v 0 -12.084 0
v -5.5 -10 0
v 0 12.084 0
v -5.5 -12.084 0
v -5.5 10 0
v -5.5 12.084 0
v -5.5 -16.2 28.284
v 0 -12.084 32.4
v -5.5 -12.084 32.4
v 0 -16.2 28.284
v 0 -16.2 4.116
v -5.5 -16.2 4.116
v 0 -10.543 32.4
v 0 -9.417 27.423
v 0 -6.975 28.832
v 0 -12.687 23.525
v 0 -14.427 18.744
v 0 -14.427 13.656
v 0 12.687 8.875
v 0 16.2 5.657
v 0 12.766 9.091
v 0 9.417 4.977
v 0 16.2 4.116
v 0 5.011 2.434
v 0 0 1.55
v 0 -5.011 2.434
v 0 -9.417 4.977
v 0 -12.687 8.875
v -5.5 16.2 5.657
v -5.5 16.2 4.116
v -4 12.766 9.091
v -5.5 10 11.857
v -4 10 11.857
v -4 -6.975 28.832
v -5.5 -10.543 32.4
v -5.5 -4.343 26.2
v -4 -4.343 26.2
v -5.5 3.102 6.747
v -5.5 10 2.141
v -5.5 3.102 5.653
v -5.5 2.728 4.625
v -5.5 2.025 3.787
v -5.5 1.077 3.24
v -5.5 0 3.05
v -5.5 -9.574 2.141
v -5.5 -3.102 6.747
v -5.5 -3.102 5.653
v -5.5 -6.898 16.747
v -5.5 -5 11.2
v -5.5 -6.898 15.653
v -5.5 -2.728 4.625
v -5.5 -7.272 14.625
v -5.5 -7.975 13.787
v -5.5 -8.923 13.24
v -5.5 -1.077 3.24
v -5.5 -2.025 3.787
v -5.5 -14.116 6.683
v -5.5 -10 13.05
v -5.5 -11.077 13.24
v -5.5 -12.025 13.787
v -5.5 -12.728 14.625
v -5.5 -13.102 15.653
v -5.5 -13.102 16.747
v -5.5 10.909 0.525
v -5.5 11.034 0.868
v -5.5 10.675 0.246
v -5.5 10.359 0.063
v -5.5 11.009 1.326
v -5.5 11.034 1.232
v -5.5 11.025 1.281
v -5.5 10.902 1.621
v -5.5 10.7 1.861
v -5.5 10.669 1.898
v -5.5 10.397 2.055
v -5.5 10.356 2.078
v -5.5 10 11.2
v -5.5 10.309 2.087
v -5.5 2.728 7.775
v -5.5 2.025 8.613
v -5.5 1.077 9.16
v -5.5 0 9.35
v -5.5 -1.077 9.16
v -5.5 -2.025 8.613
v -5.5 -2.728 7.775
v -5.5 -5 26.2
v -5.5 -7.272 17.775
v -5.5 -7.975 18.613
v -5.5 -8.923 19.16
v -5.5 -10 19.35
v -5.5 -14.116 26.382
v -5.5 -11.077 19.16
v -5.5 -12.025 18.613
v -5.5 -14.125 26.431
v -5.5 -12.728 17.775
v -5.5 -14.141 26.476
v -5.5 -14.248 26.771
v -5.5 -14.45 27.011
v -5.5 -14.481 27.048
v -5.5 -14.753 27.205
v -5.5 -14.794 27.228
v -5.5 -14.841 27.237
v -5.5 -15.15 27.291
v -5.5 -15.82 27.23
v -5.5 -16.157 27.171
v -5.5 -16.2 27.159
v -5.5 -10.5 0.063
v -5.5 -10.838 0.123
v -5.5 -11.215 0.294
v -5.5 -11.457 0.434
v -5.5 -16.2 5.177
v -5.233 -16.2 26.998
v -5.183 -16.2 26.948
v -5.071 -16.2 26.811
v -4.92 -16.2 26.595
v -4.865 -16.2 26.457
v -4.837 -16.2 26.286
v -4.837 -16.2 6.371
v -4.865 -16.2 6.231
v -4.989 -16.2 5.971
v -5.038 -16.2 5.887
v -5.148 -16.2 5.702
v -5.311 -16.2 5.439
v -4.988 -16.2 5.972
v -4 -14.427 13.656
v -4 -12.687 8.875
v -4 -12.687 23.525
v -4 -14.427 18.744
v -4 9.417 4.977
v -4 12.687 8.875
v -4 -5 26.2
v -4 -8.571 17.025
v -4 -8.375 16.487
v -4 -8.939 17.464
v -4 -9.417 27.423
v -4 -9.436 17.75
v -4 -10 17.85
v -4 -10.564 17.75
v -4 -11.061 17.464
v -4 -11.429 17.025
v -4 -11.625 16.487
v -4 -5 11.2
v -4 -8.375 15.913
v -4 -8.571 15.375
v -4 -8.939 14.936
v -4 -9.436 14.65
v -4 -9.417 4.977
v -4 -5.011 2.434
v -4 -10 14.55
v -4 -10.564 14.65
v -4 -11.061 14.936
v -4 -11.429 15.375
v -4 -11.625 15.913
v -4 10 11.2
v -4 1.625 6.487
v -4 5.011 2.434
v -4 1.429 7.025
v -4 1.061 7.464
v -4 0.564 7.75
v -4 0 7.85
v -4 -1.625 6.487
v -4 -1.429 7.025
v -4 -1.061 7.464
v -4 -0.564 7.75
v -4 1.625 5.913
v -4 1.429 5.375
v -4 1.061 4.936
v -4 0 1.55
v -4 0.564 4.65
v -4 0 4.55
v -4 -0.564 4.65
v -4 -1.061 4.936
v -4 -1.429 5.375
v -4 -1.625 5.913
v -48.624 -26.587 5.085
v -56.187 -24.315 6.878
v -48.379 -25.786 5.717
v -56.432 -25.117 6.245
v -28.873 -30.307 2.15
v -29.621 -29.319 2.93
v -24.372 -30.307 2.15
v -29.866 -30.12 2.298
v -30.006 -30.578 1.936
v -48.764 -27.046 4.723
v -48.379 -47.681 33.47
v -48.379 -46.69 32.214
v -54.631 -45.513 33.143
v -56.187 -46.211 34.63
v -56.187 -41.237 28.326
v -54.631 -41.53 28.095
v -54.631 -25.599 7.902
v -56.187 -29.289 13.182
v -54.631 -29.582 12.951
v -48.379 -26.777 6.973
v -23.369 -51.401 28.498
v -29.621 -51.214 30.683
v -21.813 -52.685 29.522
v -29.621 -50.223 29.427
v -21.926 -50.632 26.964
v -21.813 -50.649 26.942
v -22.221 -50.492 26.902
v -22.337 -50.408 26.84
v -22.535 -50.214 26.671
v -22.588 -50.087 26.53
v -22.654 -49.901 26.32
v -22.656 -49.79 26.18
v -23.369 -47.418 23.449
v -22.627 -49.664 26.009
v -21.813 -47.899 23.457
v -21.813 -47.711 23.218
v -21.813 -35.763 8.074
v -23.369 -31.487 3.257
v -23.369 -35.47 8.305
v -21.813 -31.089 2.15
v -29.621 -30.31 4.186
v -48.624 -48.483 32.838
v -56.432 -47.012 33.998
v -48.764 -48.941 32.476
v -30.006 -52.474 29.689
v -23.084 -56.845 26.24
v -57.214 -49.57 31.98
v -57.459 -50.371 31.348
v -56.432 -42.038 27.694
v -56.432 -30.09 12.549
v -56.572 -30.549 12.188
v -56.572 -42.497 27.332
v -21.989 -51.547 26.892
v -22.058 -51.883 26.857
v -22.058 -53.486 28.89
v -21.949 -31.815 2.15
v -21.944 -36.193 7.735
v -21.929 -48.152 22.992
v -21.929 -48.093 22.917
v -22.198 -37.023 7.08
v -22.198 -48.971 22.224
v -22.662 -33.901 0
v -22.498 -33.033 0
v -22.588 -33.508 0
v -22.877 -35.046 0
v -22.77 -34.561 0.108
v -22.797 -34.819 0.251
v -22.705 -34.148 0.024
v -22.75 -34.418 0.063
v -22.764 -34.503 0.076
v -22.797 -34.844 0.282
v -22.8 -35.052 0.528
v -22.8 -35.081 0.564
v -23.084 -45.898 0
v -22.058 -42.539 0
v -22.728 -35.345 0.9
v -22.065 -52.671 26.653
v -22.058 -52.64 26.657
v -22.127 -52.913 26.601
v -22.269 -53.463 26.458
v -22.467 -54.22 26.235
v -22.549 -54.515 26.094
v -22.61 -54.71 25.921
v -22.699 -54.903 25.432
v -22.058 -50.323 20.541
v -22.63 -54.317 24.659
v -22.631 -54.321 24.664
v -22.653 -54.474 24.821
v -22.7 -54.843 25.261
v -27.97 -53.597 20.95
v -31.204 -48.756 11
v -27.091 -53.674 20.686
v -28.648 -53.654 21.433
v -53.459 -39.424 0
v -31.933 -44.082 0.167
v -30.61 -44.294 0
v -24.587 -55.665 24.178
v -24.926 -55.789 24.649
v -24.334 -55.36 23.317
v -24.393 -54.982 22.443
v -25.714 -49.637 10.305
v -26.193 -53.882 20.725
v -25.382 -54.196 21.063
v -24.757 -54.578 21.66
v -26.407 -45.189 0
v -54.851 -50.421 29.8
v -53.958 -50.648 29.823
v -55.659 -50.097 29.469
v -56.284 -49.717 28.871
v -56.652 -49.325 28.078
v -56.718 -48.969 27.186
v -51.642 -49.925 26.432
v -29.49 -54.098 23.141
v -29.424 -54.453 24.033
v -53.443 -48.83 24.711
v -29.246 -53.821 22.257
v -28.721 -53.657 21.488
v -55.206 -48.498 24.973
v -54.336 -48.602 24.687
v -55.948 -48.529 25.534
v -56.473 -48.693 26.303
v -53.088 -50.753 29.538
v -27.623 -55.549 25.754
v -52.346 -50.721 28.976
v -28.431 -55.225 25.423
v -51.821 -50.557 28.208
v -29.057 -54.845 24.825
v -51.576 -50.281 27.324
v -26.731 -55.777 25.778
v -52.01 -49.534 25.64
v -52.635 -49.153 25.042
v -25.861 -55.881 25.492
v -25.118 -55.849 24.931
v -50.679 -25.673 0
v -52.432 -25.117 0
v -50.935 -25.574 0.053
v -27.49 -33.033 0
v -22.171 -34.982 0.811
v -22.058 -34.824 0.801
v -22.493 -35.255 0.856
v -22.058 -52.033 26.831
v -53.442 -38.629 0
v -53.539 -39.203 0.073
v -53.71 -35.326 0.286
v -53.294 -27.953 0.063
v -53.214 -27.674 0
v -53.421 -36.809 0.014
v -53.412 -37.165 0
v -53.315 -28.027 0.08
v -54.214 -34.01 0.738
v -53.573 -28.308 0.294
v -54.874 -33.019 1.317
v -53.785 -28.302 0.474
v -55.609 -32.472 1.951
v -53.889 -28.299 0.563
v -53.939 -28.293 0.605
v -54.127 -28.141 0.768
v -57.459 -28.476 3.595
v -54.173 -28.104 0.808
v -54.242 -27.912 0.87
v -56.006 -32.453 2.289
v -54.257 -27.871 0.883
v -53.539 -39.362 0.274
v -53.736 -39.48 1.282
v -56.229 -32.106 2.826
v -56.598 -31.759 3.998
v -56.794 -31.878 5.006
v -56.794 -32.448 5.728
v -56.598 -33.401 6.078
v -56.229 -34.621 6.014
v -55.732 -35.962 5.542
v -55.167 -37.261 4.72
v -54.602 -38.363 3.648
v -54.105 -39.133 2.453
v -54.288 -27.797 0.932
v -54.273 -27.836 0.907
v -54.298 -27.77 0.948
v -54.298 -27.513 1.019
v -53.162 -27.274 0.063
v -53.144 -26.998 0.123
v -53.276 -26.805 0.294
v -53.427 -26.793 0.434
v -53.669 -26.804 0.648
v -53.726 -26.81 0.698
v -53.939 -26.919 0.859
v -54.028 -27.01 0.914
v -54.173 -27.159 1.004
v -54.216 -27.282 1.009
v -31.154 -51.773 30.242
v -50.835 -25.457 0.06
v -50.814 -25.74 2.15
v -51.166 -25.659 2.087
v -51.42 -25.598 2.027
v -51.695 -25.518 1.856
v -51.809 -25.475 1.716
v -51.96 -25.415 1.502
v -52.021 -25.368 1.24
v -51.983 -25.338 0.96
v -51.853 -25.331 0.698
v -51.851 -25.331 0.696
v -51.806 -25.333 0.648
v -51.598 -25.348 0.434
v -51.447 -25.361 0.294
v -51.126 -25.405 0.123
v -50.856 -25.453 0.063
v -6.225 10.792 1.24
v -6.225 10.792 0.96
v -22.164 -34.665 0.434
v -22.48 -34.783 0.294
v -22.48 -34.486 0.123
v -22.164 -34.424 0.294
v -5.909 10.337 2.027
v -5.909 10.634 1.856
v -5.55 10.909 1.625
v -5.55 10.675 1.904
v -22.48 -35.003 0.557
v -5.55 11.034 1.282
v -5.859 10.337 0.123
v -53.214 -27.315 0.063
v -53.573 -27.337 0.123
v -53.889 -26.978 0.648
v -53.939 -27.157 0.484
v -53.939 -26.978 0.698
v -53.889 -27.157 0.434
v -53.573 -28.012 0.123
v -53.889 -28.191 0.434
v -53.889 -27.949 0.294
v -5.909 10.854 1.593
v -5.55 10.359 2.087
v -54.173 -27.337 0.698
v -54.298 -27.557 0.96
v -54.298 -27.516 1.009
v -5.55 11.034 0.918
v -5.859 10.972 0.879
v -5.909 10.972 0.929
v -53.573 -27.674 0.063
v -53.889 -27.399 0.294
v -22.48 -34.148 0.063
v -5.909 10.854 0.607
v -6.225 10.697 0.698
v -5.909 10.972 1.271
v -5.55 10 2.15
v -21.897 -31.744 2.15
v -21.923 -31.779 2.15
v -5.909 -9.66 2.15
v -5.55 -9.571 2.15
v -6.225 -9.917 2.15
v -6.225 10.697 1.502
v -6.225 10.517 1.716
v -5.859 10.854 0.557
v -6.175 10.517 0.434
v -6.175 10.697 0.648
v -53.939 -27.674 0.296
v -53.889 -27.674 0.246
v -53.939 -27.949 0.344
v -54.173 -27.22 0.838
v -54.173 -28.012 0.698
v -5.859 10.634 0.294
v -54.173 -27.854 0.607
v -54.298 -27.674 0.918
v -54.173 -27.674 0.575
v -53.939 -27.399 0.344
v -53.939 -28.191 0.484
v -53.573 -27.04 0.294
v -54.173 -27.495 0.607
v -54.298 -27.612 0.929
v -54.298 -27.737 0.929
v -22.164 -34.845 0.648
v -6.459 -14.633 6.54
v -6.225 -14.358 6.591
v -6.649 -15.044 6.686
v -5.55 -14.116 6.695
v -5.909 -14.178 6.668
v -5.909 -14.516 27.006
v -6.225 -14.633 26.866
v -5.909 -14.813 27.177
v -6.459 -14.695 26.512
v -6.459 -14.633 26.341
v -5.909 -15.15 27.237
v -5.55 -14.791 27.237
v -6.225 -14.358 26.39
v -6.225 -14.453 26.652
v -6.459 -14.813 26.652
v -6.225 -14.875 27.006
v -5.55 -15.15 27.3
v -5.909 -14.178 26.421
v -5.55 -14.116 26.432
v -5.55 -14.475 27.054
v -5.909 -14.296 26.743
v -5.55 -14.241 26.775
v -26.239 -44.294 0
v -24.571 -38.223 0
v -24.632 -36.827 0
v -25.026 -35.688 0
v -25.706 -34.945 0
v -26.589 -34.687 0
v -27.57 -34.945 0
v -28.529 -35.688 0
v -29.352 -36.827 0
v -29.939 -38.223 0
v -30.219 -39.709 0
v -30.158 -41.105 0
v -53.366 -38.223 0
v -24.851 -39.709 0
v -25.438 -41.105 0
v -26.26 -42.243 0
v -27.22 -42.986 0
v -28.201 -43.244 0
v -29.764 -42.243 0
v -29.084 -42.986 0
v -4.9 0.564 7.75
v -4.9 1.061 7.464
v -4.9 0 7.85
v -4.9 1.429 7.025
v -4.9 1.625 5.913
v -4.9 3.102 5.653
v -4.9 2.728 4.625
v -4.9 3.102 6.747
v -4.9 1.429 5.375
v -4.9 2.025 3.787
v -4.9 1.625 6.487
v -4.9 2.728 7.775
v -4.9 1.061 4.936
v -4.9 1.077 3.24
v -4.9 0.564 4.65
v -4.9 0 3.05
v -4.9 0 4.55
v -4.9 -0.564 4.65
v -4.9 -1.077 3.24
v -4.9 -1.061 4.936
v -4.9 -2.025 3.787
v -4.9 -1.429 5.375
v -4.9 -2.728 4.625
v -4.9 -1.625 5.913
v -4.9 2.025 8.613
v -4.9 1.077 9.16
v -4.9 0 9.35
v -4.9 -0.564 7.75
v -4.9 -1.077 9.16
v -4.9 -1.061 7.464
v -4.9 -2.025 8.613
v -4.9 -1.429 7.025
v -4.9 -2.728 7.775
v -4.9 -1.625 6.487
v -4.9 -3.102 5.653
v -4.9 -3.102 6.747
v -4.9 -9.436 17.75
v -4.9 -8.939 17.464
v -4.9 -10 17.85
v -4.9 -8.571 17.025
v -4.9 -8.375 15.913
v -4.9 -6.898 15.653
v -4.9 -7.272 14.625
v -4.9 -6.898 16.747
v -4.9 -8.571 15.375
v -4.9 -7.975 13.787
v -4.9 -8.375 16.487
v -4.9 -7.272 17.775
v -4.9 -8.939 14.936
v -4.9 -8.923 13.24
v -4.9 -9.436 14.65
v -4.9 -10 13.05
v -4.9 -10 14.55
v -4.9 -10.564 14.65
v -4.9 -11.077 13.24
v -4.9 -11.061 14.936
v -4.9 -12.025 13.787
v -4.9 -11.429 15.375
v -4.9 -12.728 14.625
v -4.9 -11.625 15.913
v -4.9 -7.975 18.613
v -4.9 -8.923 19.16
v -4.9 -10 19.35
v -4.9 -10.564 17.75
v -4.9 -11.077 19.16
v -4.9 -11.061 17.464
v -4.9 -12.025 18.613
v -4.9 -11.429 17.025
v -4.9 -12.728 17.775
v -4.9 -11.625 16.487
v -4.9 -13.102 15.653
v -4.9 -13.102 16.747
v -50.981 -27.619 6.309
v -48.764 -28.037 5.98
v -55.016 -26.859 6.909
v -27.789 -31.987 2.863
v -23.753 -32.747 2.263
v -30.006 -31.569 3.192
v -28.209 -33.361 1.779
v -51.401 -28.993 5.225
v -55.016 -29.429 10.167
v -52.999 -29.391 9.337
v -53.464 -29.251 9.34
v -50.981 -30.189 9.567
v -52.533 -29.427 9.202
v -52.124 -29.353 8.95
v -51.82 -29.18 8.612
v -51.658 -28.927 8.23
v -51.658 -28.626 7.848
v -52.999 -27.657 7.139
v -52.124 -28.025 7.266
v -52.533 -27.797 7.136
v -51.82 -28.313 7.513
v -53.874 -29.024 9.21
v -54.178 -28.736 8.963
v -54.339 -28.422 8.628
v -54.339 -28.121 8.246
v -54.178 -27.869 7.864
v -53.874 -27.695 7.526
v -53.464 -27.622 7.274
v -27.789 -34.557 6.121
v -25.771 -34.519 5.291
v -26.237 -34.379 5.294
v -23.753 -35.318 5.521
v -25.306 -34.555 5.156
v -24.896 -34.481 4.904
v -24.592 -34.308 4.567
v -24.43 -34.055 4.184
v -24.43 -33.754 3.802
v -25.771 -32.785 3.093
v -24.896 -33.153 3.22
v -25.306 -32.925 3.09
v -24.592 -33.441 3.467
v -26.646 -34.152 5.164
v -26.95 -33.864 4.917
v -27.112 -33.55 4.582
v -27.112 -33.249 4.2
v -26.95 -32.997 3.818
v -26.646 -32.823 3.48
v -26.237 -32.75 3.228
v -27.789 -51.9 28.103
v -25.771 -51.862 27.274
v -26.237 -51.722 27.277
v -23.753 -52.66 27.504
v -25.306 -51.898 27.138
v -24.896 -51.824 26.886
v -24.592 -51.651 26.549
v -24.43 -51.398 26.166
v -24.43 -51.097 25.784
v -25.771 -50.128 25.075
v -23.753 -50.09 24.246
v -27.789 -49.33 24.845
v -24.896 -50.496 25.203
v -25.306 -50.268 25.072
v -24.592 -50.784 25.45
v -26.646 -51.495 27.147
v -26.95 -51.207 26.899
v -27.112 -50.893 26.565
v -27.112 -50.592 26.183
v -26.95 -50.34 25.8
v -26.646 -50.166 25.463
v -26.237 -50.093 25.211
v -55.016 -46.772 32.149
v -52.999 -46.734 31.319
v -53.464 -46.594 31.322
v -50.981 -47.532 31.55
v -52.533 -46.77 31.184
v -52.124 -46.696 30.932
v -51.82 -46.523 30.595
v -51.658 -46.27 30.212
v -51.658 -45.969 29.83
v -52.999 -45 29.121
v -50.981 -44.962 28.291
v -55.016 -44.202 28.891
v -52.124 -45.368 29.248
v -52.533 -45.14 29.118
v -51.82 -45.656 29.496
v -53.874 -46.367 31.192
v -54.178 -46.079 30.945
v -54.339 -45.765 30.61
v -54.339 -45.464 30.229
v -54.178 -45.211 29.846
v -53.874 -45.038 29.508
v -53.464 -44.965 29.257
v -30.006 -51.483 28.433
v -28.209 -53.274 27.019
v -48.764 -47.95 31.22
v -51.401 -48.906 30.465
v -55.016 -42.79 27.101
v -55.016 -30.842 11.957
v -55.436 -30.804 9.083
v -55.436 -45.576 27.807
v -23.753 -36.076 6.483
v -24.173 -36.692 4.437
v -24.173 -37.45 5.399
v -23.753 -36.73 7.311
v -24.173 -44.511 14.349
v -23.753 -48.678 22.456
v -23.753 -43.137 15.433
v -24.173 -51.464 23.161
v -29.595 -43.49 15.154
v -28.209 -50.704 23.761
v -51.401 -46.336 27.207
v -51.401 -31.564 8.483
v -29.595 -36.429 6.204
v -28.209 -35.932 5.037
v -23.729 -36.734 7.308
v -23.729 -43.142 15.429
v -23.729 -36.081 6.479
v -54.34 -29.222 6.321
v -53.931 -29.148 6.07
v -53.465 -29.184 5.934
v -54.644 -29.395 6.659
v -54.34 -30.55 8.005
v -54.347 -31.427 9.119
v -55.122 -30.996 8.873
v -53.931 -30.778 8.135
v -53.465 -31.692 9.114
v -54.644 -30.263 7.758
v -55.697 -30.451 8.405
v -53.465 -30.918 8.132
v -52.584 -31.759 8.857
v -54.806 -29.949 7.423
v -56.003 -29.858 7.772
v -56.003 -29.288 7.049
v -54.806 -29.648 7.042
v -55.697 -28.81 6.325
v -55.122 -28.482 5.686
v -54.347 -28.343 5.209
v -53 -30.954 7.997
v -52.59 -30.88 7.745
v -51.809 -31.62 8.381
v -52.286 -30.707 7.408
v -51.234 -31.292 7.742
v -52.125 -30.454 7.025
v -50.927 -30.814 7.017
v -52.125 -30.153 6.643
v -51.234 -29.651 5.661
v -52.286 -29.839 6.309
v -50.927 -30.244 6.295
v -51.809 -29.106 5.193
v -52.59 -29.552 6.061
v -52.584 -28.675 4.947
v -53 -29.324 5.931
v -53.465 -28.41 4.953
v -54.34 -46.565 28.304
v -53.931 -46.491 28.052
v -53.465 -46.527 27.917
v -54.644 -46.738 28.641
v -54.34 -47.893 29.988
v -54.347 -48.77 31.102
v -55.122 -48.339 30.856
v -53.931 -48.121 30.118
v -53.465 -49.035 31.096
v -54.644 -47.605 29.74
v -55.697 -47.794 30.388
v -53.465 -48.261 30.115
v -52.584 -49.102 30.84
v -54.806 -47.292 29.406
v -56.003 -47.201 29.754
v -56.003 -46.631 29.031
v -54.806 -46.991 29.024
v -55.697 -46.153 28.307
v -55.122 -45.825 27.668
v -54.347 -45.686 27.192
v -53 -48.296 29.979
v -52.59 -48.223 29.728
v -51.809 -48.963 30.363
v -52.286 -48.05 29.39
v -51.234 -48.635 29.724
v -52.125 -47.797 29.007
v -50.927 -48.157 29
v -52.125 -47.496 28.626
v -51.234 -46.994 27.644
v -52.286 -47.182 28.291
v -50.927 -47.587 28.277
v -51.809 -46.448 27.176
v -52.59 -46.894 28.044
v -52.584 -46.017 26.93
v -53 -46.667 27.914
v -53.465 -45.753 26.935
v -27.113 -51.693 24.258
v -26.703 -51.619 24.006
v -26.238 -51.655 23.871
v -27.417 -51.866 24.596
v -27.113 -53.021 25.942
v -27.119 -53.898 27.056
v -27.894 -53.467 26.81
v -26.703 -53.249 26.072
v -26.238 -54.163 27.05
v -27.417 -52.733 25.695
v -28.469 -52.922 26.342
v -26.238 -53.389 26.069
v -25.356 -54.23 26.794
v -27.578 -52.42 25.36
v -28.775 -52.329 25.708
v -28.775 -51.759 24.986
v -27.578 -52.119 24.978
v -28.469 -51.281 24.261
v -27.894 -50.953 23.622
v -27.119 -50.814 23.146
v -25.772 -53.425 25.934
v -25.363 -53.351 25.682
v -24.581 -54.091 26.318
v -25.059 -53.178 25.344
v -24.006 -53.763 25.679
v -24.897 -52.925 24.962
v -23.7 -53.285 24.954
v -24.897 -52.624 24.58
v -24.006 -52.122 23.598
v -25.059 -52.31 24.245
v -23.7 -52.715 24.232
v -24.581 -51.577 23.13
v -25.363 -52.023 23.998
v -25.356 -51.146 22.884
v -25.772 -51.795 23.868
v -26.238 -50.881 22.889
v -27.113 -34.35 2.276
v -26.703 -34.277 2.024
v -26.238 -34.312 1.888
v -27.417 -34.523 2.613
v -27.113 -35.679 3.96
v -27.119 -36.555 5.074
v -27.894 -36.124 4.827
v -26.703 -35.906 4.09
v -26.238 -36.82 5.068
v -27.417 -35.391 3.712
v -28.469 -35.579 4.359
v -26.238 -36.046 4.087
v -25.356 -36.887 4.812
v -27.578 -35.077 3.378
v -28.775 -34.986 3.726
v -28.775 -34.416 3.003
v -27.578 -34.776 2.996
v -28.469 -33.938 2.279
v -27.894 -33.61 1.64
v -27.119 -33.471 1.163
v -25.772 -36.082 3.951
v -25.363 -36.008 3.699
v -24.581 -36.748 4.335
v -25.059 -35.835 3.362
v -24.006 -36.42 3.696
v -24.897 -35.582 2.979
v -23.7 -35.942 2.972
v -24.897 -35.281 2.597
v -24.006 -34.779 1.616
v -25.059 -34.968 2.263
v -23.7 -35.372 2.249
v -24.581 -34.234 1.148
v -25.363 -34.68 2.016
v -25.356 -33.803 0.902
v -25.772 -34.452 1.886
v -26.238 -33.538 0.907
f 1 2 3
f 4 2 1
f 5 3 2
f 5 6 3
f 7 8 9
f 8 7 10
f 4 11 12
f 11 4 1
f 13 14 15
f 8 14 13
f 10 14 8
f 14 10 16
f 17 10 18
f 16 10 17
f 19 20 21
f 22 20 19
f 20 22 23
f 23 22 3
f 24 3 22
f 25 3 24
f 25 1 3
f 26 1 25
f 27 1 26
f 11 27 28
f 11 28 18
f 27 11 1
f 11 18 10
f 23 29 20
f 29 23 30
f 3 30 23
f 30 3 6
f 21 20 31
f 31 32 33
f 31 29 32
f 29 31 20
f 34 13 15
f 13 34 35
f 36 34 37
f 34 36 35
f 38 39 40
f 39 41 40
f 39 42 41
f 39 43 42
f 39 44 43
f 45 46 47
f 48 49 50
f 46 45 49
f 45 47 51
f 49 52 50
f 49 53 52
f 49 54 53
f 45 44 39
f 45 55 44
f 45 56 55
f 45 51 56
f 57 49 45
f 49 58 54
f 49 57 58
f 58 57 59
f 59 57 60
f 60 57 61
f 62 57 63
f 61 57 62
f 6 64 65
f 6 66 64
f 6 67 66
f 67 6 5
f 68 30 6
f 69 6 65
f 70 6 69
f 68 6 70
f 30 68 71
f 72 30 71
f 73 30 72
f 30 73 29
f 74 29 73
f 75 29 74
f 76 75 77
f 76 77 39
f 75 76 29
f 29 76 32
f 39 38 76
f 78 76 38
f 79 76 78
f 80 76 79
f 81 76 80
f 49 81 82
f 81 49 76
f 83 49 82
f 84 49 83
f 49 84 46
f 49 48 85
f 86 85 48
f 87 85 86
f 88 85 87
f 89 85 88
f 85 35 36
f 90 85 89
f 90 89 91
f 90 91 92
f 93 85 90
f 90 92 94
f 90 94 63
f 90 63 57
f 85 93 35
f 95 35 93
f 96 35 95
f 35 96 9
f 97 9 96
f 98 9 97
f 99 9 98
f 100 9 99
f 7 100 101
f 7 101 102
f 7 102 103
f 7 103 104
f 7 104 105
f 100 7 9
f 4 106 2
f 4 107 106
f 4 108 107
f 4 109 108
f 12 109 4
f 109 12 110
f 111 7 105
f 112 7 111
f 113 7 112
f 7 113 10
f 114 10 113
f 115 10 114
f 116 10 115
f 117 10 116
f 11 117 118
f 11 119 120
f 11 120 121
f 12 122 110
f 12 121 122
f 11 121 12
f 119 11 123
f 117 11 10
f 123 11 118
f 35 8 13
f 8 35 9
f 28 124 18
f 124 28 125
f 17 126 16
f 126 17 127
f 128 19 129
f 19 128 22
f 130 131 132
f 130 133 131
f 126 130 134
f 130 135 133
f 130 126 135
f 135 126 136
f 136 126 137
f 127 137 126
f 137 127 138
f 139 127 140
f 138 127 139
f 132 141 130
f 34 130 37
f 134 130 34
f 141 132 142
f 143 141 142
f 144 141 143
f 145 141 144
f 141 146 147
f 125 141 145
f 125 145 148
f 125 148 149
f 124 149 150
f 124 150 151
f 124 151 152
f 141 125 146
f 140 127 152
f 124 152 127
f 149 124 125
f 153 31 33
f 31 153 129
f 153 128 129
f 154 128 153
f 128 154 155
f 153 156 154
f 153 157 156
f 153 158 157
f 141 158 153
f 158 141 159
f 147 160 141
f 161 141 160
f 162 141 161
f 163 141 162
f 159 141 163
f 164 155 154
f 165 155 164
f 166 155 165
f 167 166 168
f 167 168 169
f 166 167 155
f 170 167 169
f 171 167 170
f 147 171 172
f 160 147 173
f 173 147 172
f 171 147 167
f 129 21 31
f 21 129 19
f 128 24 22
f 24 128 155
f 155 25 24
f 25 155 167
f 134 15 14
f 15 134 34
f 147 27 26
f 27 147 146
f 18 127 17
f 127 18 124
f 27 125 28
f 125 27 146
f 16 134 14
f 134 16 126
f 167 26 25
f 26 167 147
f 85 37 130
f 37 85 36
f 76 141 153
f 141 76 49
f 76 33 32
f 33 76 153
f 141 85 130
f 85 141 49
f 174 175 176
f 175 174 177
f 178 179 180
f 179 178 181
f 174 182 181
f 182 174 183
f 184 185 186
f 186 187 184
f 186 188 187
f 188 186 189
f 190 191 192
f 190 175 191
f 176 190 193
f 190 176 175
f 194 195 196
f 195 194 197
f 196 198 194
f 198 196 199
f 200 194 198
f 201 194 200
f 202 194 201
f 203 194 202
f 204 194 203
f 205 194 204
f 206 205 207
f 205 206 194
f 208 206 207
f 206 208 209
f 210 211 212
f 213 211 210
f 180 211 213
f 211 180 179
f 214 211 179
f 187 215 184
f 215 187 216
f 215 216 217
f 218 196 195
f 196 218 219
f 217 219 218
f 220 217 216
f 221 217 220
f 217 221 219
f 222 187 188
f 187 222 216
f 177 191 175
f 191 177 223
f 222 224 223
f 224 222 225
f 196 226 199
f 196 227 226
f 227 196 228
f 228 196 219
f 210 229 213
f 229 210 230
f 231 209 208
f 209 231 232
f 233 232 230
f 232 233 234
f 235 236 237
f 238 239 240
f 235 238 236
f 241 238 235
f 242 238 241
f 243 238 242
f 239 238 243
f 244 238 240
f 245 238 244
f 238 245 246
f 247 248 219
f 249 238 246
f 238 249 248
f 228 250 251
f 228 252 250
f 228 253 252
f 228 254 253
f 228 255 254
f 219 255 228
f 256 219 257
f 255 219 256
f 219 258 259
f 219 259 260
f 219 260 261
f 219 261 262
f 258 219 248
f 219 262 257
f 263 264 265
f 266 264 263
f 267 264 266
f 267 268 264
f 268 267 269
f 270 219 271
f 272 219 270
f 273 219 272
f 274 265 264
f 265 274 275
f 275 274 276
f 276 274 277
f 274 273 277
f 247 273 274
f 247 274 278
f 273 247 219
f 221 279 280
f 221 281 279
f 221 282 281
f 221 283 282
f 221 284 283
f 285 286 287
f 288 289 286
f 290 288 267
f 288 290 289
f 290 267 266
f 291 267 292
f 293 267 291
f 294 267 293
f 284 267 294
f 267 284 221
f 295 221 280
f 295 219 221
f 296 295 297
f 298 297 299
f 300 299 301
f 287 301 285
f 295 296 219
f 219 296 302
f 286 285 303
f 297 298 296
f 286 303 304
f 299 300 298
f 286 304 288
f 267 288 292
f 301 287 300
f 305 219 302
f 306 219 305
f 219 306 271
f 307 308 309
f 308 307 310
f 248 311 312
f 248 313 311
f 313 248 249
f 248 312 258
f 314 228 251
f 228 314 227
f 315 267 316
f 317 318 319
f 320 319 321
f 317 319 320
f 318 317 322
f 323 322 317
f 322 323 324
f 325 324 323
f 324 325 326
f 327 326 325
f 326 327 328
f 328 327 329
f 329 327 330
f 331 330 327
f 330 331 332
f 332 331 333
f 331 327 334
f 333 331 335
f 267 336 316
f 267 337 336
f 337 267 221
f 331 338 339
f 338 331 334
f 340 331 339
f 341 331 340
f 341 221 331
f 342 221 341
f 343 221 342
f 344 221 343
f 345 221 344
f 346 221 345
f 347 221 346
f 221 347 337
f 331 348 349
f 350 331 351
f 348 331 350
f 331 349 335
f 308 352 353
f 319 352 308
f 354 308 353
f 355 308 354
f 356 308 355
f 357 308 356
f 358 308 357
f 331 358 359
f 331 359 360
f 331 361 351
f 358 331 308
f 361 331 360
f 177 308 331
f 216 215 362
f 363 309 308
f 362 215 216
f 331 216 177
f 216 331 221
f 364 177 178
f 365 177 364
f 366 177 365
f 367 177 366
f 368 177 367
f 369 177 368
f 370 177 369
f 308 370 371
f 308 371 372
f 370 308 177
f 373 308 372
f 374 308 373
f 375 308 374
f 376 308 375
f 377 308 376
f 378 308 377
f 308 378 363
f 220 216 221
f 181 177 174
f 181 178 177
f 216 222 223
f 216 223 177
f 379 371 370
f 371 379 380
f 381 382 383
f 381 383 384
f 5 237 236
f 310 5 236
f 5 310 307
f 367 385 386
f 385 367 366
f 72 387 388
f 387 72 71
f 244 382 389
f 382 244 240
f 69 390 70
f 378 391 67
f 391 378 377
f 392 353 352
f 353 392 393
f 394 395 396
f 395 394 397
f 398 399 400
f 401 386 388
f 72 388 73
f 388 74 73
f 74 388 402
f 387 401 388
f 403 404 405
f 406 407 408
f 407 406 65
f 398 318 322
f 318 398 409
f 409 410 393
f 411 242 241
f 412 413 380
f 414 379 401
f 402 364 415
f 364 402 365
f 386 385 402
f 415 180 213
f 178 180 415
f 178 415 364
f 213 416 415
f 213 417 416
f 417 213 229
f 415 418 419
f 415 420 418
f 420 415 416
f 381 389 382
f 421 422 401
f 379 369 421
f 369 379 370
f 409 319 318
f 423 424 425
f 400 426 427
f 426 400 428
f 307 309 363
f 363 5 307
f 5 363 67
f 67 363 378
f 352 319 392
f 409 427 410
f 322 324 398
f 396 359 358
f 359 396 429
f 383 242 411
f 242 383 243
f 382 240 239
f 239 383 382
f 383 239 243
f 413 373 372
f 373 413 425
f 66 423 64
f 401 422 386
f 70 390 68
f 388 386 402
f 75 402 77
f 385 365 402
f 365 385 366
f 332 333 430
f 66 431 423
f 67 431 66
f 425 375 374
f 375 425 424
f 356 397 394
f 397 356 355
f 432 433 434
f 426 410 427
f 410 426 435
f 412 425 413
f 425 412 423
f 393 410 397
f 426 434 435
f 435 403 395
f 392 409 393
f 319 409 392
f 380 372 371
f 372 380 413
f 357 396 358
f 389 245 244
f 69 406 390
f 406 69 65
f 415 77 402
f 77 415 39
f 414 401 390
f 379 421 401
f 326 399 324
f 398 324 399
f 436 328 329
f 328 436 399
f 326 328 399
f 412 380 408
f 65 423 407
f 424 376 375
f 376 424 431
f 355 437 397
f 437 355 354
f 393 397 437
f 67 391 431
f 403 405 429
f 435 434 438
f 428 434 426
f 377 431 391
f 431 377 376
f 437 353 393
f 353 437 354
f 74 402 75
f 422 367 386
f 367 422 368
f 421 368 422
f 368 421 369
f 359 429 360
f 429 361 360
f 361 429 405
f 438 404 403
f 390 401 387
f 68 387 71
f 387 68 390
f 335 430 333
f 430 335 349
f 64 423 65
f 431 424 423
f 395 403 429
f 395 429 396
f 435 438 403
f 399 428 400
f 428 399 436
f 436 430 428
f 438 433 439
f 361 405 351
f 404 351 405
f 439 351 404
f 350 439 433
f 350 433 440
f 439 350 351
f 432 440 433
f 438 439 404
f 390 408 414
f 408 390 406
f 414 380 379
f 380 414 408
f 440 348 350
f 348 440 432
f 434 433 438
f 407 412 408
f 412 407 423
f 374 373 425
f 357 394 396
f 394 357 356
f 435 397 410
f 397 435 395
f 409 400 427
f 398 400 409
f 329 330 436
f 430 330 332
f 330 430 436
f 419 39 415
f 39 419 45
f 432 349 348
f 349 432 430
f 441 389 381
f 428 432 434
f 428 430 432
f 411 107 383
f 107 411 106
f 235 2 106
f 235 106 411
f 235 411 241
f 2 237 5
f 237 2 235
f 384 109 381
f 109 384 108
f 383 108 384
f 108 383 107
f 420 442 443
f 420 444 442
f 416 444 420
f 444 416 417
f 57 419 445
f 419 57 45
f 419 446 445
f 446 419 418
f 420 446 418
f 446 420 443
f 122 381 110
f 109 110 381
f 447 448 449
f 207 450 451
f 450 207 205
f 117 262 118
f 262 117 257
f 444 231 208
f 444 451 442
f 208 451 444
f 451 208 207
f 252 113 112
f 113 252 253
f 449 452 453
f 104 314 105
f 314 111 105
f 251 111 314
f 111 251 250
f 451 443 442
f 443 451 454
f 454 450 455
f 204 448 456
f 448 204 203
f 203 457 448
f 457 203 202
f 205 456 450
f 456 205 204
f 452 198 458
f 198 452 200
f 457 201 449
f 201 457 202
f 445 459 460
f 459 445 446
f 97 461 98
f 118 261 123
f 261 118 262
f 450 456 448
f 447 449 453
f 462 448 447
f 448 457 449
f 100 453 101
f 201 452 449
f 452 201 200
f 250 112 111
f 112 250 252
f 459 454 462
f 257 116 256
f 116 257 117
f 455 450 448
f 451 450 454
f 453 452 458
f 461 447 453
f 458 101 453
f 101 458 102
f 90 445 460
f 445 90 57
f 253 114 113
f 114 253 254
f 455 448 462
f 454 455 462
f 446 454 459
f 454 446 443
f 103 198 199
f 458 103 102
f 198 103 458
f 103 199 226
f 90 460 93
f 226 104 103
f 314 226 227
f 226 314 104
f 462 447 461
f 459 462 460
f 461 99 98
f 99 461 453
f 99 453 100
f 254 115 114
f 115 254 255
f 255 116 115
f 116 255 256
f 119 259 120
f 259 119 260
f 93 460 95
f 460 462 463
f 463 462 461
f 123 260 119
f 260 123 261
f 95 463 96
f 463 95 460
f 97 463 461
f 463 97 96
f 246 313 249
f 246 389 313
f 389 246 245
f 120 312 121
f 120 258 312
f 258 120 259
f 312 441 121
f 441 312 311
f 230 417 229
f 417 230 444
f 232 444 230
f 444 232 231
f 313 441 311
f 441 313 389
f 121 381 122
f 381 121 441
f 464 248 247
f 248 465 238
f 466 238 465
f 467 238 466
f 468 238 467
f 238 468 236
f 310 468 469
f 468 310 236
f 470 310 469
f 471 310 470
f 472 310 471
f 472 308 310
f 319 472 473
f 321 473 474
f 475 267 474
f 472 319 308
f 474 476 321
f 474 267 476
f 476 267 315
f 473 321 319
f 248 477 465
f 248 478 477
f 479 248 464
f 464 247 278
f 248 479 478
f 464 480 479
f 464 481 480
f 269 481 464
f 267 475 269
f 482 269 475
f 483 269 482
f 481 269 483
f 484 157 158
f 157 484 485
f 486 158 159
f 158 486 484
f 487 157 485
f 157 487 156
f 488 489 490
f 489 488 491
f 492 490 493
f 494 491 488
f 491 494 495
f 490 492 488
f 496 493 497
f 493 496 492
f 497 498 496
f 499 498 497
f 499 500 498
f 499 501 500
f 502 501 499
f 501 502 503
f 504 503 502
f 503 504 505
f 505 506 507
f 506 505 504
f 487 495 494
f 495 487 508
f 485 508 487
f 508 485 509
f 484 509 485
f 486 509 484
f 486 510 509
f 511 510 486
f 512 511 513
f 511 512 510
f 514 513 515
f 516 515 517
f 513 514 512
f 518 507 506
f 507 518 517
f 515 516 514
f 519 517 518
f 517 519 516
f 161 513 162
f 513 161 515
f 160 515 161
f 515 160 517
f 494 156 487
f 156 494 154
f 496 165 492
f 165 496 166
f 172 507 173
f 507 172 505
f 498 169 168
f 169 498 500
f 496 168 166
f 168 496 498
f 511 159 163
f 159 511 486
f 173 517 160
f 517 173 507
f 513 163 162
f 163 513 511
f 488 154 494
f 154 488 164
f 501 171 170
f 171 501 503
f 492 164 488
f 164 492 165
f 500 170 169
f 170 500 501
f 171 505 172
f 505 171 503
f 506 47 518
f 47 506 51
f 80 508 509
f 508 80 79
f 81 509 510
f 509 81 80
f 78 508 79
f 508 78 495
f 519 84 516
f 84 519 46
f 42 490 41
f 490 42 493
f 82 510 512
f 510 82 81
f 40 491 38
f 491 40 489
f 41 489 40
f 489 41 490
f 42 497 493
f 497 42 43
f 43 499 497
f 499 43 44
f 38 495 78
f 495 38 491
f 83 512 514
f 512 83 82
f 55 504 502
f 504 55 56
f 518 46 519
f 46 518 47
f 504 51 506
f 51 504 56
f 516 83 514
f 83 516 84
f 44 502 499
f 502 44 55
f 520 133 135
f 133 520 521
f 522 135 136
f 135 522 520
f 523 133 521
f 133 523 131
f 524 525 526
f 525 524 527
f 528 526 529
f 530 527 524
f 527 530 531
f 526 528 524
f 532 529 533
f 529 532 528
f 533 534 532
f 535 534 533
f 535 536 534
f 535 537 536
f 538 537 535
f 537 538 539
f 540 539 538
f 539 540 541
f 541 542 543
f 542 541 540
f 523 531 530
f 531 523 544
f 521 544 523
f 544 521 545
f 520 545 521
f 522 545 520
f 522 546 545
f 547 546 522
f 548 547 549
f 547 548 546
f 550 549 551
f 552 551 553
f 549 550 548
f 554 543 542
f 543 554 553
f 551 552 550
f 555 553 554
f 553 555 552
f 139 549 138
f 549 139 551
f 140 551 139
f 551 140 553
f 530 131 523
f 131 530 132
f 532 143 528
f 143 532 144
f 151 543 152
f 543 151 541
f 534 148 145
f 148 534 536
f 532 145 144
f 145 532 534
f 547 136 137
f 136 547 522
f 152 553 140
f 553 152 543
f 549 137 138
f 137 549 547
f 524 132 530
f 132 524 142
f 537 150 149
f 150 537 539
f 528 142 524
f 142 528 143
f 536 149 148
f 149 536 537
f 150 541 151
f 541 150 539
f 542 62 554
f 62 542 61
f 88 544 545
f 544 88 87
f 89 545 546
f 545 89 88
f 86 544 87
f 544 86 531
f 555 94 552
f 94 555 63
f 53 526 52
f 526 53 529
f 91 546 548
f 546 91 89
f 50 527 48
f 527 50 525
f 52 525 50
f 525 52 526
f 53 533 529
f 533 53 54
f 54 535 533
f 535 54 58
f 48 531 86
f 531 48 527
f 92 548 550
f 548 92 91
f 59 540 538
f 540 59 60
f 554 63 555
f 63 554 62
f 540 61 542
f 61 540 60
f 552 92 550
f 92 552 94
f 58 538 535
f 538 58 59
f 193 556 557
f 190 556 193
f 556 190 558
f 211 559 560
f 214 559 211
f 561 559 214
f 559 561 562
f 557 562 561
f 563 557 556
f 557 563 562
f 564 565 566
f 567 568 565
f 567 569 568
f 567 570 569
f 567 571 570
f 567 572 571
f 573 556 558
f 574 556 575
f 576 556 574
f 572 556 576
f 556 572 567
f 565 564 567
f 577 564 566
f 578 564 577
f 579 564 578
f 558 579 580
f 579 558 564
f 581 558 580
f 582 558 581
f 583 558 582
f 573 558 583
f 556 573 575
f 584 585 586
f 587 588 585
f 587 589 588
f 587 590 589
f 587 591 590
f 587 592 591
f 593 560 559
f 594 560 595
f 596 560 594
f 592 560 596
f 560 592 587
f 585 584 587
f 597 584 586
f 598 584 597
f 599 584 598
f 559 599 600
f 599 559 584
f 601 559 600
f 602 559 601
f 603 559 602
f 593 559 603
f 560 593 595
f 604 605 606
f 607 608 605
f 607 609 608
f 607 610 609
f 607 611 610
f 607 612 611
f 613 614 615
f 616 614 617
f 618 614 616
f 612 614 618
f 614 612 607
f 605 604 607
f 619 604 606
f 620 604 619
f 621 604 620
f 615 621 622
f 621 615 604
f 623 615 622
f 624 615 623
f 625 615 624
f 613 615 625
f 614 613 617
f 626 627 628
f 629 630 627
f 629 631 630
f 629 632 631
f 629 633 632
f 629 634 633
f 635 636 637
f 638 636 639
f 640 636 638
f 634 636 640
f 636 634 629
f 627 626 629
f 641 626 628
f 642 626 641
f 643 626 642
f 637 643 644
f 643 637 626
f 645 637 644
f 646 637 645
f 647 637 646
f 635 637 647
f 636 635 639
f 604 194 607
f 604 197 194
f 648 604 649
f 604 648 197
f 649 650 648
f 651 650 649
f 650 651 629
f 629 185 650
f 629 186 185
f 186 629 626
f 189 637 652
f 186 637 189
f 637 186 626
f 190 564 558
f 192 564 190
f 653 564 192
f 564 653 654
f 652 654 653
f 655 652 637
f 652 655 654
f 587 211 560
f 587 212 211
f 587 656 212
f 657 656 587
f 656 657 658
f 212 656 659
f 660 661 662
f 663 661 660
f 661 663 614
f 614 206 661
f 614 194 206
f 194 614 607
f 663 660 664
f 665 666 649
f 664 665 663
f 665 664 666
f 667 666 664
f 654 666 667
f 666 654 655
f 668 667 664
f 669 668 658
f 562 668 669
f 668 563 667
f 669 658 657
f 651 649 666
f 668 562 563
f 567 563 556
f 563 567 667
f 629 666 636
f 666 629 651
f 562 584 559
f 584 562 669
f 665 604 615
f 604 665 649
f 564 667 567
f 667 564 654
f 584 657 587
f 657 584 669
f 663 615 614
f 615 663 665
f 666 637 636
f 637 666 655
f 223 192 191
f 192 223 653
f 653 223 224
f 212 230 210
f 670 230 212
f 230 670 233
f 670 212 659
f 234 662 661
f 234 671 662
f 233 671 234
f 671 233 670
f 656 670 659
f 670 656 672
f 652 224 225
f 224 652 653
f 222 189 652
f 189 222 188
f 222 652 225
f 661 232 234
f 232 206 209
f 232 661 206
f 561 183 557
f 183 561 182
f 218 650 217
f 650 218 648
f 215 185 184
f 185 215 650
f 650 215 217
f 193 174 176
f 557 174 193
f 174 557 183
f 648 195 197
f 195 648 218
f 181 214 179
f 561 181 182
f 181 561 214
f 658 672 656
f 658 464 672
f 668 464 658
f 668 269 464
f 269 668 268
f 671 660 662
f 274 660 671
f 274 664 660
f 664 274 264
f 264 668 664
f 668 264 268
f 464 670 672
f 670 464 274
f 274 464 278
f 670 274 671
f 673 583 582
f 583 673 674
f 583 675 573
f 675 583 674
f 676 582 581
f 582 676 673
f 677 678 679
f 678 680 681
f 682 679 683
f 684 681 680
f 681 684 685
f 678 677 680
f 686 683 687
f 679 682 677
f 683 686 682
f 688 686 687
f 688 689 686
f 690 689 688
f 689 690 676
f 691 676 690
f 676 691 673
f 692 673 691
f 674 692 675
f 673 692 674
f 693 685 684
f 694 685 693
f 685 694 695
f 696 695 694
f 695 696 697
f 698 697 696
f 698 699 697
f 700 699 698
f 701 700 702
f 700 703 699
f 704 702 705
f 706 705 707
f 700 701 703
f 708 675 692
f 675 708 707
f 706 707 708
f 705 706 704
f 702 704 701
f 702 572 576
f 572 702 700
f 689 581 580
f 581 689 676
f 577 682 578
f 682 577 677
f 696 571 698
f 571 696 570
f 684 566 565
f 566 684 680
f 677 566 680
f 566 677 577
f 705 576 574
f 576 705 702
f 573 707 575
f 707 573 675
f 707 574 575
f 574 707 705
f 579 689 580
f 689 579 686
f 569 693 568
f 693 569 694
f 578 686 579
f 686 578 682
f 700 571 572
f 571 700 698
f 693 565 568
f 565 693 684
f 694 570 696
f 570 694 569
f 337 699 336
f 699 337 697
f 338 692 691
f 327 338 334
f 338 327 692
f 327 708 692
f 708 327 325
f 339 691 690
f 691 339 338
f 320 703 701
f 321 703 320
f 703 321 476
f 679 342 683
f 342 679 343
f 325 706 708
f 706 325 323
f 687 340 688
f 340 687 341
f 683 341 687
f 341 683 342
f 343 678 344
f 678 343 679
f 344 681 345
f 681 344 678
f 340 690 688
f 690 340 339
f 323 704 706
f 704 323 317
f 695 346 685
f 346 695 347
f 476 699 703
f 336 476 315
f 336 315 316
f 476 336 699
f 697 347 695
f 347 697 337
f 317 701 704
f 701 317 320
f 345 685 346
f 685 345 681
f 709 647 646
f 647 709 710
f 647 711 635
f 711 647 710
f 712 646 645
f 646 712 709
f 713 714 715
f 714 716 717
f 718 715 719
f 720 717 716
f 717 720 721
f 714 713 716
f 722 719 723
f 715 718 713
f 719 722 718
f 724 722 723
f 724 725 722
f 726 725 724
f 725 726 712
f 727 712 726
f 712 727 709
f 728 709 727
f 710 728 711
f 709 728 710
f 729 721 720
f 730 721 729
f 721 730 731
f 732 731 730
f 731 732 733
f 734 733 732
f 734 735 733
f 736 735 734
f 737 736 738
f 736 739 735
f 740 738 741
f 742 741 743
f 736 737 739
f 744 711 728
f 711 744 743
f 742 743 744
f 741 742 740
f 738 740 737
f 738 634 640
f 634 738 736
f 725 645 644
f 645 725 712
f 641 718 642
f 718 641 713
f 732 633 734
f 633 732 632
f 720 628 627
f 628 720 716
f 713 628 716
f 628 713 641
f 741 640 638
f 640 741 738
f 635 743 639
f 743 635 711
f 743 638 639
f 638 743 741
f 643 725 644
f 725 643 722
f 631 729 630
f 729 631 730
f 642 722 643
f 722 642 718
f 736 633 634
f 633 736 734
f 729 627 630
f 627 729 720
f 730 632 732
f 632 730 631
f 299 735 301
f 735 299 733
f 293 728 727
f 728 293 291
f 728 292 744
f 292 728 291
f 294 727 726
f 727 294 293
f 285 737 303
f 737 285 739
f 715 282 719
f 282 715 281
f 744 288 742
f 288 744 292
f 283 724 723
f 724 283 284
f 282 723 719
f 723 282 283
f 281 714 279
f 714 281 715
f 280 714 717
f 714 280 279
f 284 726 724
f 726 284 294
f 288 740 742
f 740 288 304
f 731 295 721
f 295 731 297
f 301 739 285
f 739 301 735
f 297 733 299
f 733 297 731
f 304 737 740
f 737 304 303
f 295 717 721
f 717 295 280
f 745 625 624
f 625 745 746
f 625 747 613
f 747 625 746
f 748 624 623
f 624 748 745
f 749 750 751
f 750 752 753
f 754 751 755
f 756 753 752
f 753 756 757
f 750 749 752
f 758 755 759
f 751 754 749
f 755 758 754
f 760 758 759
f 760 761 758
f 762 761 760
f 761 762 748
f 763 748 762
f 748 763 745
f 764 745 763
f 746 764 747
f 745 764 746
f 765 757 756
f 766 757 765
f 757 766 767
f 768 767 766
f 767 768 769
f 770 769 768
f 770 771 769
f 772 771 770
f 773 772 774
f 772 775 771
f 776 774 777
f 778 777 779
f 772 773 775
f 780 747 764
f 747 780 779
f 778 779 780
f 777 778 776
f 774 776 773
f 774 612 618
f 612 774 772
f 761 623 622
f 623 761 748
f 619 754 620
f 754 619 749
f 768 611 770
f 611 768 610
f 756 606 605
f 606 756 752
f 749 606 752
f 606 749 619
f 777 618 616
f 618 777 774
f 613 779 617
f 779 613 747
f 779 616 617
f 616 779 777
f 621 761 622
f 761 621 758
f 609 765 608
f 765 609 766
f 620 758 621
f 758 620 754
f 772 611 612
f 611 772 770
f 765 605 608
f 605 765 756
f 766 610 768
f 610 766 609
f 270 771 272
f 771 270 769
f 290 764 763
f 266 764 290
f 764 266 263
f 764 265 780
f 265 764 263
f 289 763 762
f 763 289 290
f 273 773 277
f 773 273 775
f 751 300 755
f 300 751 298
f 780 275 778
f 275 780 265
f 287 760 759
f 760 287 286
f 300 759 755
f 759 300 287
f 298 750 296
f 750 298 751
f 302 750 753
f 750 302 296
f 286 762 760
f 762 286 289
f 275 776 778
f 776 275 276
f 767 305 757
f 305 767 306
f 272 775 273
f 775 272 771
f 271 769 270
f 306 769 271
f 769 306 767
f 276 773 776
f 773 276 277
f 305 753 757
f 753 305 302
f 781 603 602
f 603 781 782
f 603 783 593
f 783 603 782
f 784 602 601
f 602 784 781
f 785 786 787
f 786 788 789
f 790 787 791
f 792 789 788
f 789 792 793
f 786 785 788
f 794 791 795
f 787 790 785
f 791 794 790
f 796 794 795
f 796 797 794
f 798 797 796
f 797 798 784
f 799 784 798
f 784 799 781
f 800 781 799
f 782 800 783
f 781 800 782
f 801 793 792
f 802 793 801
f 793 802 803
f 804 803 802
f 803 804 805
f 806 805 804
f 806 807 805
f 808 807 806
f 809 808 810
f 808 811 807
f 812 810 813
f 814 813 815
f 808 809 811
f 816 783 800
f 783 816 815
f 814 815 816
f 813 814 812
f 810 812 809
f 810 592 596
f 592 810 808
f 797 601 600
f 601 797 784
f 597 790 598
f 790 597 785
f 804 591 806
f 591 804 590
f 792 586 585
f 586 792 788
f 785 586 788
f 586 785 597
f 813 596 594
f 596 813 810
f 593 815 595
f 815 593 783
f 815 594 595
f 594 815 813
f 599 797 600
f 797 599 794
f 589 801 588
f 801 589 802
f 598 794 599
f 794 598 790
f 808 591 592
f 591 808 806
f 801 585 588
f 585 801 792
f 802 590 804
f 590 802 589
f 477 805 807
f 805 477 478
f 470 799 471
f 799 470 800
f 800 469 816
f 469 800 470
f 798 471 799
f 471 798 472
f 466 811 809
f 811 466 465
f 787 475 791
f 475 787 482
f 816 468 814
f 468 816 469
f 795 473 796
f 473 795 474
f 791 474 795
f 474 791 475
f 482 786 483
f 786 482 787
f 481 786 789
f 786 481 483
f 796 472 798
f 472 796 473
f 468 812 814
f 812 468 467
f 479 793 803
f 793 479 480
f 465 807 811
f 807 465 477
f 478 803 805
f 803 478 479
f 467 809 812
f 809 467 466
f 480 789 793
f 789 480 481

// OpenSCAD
// Generated from camera_mount.py
$fa=20; $fs=0.2;


difference(){
	translate(v = [0, 0, 16.2000000000]) {
		rotate(a = 90, v = [0, -1, 0]) {
			difference() {
				union() {
					union() {
						union() {
							difference() {
								difference() {
									difference() {
										linear_extrude(center = false, height = 5.5000000000) {
											intersection() {
												rotate(a = 45) {
													translate(v = [-20, -20]) {
														square(size = [24, 40]);
													}
												}
												square(center = true, size = [32.4000000000, 32.4000000000]);
											}
										}
										translate(v = [-10, 0, 0]) {
											translate(v = [0, 0, 4.9000000000]) {
											}
										}
									}
									translate(v = [0, -10, 0]) {
										translate(v = [0, 0, 4.9000000000]) {
										}
									}
								}
								union() {
									cylinder(h = 4.0000000000, r = 14.6500000000);
									translate(v = [-5, -5, 0]) {
										cube(size = [15, 15, 5.5000200000]);
									}
								}
							}
							translate(v = [2, -38.5000000000, 39.0000000000]) {
								rotate(a = 141.7284958095, v = [0, 0, 1]) {
									rotate(a = 103.4903442936, v = [1, 0, 0]) {
										translate(v = [0, 0, -1.6500000000]) {
											union() {
												union() {
													union() {
														union() {
															difference() {
																translate(v = [-17.6750000000, -17.6750000000, -3.8000000000]) {
																	cube(center = false, size = [35.3500000000, 35.3500000000, 5.4500000000]);
																}
															}
															translate(v = [14.0000000000, 14.0000000000, 0]) {
																union() {
																	translate(v = [-2.0750000000, -2.0750000000, -1.8000000000]) {
																		cube(center = false, size = [4.1500000000, 4.1500000000, 1.8000000000]);
																	}
																	translate(v = [0, 0, -2.0000000000]) {
																		mirror(v = [0, 0, 1]) {
																		}
																	}
																}
															}
														}
														translate(v = [-14.0000000000, 14.0000000000, 0]) {
															union() {
																translate(v = [-2.0750000000, -2.0750000000, -1.8000000000]) {
																	cube(center = false, size = [4.1500000000, 4.1500000000, 1.8000000000]);
																}
																translate(v = [0, 0, -2.0000000000]) {
																	mirror(v = [0, 0, 1]) {
																	}
																}
															}
														}
													}
													translate(v = [-14.0000000000, -14.0000000000, 0]) {
														union() {
															translate(v = [-2.0750000000, -2.0750000000, -1.8000000000]) {
																cube(center = false, size = [4.1500000000, 4.1500000000, 1.8000000000]);
															}
															translate(v = [0, 0, -2.0000000000]) {
																mirror(v = [0, 0, 1]) {
																}
															}
														}
													}
												}
												translate(v = [14.0000000000, -14.0000000000, 0]) {
													union() {
														translate(v = [-2.0750000000, -2.0750000000, -1.8000000000]) {
															cube(center = false, size = [4.1500000000, 4.1500000000, 1.8000000000]);
														}
														translate(v = [0, 0, -2.0000000000]) {
															mirror(v = [0, 0, 1]) {
															}
														}
													}
												}
											}
										}
									}
								}
							}
						}
						polyhedron(faces = [[0, 2, 14], [15, 2, 0], [0, 7, 15], [14, 10, 0], [14, 2, 1], [1, 2, 15], [15, 3, 1], [1, 13, 14], [15, 4, 3], [6, 10, 14], [14, 13, 6], [7, 4, 15], [11, 7, 0], [0, 10, 11], [1, 3, 12], [12, 13, 1], [3, 4, 12], [8, 12, 4], [13, 5, 6], [9, 10, 6], [11, 4, 7], [9, 11, 10], [12, 8, 9], [13, 12, 9], [11, 8, 4], [5, 13, 9], [6, 5, 9], [8, 11, 9]], points = [[-16.2000000000, -42.5386946614, 22.0576121145], [-16.2000000000, -39.423557734, 53.4587175901], [-16.2000000000, -45.8977578213, 23.0840506837], [-16.2000000000, -27.6742687274, 53.2137720224], [-16.2000000000, -25.1168001852, 52.4322790208], [15.7801466406, -49.5696575051, 57.2137720224], [9.62235765664, -54.9938575924, 23.889105116], [-15.1499900000, -34.1484688147, 22.839105116], [-9.95488857563, -25.1168001852, 56.4322790208], [17.797849132, -47.0121889629, 56.4322790208], [12.6900601481, -53.4863890502, 22.0576121145], [-15.0626775596, -31.5910002725, 22.0576121145], [-12.6050052809, -28.4758633451, 57.4587175901], [15.1477324268, -50.3712521228, 57.4587175901], [10.0399434429, -56.8454522102, 23.0840506837], [-17.7127942648, -34.9500634324, 23.0840506837]]);
					}
					union() {
						union() {
							minkowski() {
								polyhedron(faces = [[0, 1, 2], [0, 2, 3], [1, 0, 4], [4, 5, 1], [2, 1, 5], [5, 6, 2], [3, 2, 6], [6, 7, 3], [0, 3, 7], [7, 4, 0], [6, 5, 4], [7, 6, 4]], points = [[-15.1500000000, 10.0000000000, 5.5000000000], [-15.1500000000, -10.0000000000, 5.5000000000], [-15.1499900000, -34.1484688147, 22.839105116], [-15.1499900000, -27.6742687274, 53.2137720224], [-15.1000000000, 10.0000000000, 5.5500000000], [-15.1000000000, -10.0000000000, 5.5500000000], [-15.0999900000, -34.1484688147, 22.889105116], [-15.0999900000, -27.6742687274, 53.2637720224]]);
								sphere(r = 1.0500000000);
							}
							minkowski() {
								polyhedron(faces = [[0, 1, 2], [1, 0, 3], [3, 4, 1], [2, 1, 4], [4, 5, 2], [0, 2, 5], [5, 3, 0], [5, 4, 3]], points = [[-15.1500000000, -10.0000000000, 5.5000000000], [-10.0000000000, -15.1500000000, 5.5000000000], [-15.1499900000, -34.1484688147, 22.839105116], [-15.1000000000, -10.0000000000, 5.5500000000], [-9.9500000000, -15.1500000000, 5.5500000000], [-15.0999900000, -34.1484688147, 22.889105116]]);
								sphere(r = 1.0500000000);
							}
						}
						minkowski() {
							polyhedron(faces = [[0, 1, 2], [0, 2, 3], [1, 0, 4], [4, 5, 1], [2, 1, 5], [5, 6, 2], [3, 2, 6], [6, 7, 3], [0, 3, 7], [7, 4, 0], [6, 5, 4], [7, 6, 4]], points = [[-10.0000000000, -15.1500000000, 5.5000000000], [10.0000000000, -15.1500000000, 5.5000000000], [9.62235765664, -54.9938575924, 23.889105116], [-15.1499900000, -34.1484688147, 22.839105116], [-9.9500000000, -15.1500000000, 5.5500000000], [10.0500000000, -15.1500000000, 5.5500000000], [9.67235765664, -54.9938575924, 23.939105116], [-15.0999900000, -34.1484688147, 22.889105116]]);
							sphere(r = 1.0500000000);
						}
					}
				}
				translate(v = [-216.2000000000, -100, -100]) {
					cube(size = [200, 200, 200]);
				}
			}
		}
	}
	/* Holes Below*/
	translate(v = [0, 0, 16.2000000000]){
		rotate(a = 90, v = [0, -1, 0]){
			difference(){
				union(){
					union(){
						union(){
							union(){
								union(){
									union(){
										translate(v = [-10, 0, 0]){
											translate(v = [0, 0, 4.9000000000]){
												union() {
													translate(v = [0, 0, -4.1500000000]) {
														cylinder(h = 4.1500000000, r = 1.6500000000);
													}
													cylinder(h = 2.5500000000, r = 3.1500000000);
												}
											}
										}
									}
									translate(v = [0, -10, 0]){
										translate(v = [0, 0, 4.9000000000]){
											union() {
												translate(v = [0, 0, -4.1500000000]) {
													cylinder(h = 4.1500000000, r = 1.6500000000);
												}
												cylinder(h = 2.5500000000, r = 3.1500000000);
											}
										}
									}
								}
							}
							translate(v = [2, -38.5000000000, 39.0000000000]){
								rotate(a = 141.7284958095, v = [0, 0, 1]){
									rotate(a = 103.4903442936, v = [1, 0, 0]){
										translate(v = [0, 0, -1.6500000000]){
											union(){
												union(){
													union(){
														union(){
															union(){
																union() {
																	union() {
																		union() {
																			union() {
																				union() {
																					translate(v = [-16.0750000000, -16.0750000000, 0]) {
																						cube(center = false, size = [32.1500000000, 32.1500000000, 1.6500100000]);
																					}
																					translate(v = [-16.0750000000, -11.9250000000, -1.8000000000]) {
																						cube(center = false, size = [32.1500000000, 23.8500000000, 1.8000100000]);
																					}
																				}
																				translate(v = [-11.9250000000, -16.0750000000, -1.8000000000]) {
																					cube(center = false, size = [23.8500000000, 32.1500000000, 1.8000100000]);
																				}
																			}
																			translate(v = [-9.6450000000, -17.6750000000, 0]) {
																				cube(center = false, size = [19.2900000000, 35.3500000000, 1.6500100000]);
																			}
																		}
																		translate(v = [-17.6750000000, -9.6450000000, 0]) {
																			cube(center = false, size = [35.3500000000, 19.2900000000, 1.6500100000]);
																		}
																	}
																	translate(v = [5, -13.3000000000, 0]) {
																		translate(v = [-5.7000000000, -2.8000000000, -15.0000000000]) {
																			cube(center = false, size = [11.4000000000, 5.6000000000, 15.0000000000]);
																		}
																	}
																}
															}
															translate(v = [14.0000000000, 14.0000000000, 0]){
																union(){
																	translate(v = [0, 0, -2.0000000000]){
																		mirror(v = [0, 0, 1]){
																			union() {
																				translate(v = [0, 0, -4.1500000000]) {
																					cylinder(h = 4.1500000000, r = 1.4000000000);
																				}
																				cylinder(h = 15.1500000000, r = 2.6500000000);
																			}
																		}
																	}
																}
															}
														}
														translate(v = [-14.0000000000, 14.0000000000, 0]){
															union(){
																translate(v = [0, 0, -2.0000000000]){
																	mirror(v = [0, 0, 1]){
																		union() {
																			translate(v = [0, 0, -4.1500000000]) {
																				cylinder(h = 4.1500000000, r = 1.4000000000);
																			}
																			cylinder(h = 15.1500000000, r = 2.6500000000);
																		}
																	}
																}
															}
														}
													}
													translate(v = [-14.0000000000, -14.0000000000, 0]){
														union(){
															translate(v = [0, 0, -2.0000000000]){
																mirror(v = [0, 0, 1]){
																	union() {
																		translate(v = [0, 0, -4.1500000000]) {
																			cylinder(h = 4.1500000000, r = 1.4000000000);
																		}
																		cylinder(h = 15.1500000000, r = 2.6500000000);
																	}
																}
															}
														}
													}
												}
												translate(v = [14.0000000000, -14.0000000000, 0]){
													union(){
														translate(v = [0, 0, -2.0000000000]){
															mirror(v = [0, 0, 1]){
																union() {
																	translate(v = [0, 0, -4.1500000000]) {
																		cylinder(h = 4.1500000000, r = 1.4000000000);
																	}
																	cylinder(h = 15.1500000000, r = 2.6500000000);
																}
															}
														}
													}
												}
											}
										}
									}
								}
							}
						}
					}
				}
			}
		}
	} /* End Holes */ 
}
